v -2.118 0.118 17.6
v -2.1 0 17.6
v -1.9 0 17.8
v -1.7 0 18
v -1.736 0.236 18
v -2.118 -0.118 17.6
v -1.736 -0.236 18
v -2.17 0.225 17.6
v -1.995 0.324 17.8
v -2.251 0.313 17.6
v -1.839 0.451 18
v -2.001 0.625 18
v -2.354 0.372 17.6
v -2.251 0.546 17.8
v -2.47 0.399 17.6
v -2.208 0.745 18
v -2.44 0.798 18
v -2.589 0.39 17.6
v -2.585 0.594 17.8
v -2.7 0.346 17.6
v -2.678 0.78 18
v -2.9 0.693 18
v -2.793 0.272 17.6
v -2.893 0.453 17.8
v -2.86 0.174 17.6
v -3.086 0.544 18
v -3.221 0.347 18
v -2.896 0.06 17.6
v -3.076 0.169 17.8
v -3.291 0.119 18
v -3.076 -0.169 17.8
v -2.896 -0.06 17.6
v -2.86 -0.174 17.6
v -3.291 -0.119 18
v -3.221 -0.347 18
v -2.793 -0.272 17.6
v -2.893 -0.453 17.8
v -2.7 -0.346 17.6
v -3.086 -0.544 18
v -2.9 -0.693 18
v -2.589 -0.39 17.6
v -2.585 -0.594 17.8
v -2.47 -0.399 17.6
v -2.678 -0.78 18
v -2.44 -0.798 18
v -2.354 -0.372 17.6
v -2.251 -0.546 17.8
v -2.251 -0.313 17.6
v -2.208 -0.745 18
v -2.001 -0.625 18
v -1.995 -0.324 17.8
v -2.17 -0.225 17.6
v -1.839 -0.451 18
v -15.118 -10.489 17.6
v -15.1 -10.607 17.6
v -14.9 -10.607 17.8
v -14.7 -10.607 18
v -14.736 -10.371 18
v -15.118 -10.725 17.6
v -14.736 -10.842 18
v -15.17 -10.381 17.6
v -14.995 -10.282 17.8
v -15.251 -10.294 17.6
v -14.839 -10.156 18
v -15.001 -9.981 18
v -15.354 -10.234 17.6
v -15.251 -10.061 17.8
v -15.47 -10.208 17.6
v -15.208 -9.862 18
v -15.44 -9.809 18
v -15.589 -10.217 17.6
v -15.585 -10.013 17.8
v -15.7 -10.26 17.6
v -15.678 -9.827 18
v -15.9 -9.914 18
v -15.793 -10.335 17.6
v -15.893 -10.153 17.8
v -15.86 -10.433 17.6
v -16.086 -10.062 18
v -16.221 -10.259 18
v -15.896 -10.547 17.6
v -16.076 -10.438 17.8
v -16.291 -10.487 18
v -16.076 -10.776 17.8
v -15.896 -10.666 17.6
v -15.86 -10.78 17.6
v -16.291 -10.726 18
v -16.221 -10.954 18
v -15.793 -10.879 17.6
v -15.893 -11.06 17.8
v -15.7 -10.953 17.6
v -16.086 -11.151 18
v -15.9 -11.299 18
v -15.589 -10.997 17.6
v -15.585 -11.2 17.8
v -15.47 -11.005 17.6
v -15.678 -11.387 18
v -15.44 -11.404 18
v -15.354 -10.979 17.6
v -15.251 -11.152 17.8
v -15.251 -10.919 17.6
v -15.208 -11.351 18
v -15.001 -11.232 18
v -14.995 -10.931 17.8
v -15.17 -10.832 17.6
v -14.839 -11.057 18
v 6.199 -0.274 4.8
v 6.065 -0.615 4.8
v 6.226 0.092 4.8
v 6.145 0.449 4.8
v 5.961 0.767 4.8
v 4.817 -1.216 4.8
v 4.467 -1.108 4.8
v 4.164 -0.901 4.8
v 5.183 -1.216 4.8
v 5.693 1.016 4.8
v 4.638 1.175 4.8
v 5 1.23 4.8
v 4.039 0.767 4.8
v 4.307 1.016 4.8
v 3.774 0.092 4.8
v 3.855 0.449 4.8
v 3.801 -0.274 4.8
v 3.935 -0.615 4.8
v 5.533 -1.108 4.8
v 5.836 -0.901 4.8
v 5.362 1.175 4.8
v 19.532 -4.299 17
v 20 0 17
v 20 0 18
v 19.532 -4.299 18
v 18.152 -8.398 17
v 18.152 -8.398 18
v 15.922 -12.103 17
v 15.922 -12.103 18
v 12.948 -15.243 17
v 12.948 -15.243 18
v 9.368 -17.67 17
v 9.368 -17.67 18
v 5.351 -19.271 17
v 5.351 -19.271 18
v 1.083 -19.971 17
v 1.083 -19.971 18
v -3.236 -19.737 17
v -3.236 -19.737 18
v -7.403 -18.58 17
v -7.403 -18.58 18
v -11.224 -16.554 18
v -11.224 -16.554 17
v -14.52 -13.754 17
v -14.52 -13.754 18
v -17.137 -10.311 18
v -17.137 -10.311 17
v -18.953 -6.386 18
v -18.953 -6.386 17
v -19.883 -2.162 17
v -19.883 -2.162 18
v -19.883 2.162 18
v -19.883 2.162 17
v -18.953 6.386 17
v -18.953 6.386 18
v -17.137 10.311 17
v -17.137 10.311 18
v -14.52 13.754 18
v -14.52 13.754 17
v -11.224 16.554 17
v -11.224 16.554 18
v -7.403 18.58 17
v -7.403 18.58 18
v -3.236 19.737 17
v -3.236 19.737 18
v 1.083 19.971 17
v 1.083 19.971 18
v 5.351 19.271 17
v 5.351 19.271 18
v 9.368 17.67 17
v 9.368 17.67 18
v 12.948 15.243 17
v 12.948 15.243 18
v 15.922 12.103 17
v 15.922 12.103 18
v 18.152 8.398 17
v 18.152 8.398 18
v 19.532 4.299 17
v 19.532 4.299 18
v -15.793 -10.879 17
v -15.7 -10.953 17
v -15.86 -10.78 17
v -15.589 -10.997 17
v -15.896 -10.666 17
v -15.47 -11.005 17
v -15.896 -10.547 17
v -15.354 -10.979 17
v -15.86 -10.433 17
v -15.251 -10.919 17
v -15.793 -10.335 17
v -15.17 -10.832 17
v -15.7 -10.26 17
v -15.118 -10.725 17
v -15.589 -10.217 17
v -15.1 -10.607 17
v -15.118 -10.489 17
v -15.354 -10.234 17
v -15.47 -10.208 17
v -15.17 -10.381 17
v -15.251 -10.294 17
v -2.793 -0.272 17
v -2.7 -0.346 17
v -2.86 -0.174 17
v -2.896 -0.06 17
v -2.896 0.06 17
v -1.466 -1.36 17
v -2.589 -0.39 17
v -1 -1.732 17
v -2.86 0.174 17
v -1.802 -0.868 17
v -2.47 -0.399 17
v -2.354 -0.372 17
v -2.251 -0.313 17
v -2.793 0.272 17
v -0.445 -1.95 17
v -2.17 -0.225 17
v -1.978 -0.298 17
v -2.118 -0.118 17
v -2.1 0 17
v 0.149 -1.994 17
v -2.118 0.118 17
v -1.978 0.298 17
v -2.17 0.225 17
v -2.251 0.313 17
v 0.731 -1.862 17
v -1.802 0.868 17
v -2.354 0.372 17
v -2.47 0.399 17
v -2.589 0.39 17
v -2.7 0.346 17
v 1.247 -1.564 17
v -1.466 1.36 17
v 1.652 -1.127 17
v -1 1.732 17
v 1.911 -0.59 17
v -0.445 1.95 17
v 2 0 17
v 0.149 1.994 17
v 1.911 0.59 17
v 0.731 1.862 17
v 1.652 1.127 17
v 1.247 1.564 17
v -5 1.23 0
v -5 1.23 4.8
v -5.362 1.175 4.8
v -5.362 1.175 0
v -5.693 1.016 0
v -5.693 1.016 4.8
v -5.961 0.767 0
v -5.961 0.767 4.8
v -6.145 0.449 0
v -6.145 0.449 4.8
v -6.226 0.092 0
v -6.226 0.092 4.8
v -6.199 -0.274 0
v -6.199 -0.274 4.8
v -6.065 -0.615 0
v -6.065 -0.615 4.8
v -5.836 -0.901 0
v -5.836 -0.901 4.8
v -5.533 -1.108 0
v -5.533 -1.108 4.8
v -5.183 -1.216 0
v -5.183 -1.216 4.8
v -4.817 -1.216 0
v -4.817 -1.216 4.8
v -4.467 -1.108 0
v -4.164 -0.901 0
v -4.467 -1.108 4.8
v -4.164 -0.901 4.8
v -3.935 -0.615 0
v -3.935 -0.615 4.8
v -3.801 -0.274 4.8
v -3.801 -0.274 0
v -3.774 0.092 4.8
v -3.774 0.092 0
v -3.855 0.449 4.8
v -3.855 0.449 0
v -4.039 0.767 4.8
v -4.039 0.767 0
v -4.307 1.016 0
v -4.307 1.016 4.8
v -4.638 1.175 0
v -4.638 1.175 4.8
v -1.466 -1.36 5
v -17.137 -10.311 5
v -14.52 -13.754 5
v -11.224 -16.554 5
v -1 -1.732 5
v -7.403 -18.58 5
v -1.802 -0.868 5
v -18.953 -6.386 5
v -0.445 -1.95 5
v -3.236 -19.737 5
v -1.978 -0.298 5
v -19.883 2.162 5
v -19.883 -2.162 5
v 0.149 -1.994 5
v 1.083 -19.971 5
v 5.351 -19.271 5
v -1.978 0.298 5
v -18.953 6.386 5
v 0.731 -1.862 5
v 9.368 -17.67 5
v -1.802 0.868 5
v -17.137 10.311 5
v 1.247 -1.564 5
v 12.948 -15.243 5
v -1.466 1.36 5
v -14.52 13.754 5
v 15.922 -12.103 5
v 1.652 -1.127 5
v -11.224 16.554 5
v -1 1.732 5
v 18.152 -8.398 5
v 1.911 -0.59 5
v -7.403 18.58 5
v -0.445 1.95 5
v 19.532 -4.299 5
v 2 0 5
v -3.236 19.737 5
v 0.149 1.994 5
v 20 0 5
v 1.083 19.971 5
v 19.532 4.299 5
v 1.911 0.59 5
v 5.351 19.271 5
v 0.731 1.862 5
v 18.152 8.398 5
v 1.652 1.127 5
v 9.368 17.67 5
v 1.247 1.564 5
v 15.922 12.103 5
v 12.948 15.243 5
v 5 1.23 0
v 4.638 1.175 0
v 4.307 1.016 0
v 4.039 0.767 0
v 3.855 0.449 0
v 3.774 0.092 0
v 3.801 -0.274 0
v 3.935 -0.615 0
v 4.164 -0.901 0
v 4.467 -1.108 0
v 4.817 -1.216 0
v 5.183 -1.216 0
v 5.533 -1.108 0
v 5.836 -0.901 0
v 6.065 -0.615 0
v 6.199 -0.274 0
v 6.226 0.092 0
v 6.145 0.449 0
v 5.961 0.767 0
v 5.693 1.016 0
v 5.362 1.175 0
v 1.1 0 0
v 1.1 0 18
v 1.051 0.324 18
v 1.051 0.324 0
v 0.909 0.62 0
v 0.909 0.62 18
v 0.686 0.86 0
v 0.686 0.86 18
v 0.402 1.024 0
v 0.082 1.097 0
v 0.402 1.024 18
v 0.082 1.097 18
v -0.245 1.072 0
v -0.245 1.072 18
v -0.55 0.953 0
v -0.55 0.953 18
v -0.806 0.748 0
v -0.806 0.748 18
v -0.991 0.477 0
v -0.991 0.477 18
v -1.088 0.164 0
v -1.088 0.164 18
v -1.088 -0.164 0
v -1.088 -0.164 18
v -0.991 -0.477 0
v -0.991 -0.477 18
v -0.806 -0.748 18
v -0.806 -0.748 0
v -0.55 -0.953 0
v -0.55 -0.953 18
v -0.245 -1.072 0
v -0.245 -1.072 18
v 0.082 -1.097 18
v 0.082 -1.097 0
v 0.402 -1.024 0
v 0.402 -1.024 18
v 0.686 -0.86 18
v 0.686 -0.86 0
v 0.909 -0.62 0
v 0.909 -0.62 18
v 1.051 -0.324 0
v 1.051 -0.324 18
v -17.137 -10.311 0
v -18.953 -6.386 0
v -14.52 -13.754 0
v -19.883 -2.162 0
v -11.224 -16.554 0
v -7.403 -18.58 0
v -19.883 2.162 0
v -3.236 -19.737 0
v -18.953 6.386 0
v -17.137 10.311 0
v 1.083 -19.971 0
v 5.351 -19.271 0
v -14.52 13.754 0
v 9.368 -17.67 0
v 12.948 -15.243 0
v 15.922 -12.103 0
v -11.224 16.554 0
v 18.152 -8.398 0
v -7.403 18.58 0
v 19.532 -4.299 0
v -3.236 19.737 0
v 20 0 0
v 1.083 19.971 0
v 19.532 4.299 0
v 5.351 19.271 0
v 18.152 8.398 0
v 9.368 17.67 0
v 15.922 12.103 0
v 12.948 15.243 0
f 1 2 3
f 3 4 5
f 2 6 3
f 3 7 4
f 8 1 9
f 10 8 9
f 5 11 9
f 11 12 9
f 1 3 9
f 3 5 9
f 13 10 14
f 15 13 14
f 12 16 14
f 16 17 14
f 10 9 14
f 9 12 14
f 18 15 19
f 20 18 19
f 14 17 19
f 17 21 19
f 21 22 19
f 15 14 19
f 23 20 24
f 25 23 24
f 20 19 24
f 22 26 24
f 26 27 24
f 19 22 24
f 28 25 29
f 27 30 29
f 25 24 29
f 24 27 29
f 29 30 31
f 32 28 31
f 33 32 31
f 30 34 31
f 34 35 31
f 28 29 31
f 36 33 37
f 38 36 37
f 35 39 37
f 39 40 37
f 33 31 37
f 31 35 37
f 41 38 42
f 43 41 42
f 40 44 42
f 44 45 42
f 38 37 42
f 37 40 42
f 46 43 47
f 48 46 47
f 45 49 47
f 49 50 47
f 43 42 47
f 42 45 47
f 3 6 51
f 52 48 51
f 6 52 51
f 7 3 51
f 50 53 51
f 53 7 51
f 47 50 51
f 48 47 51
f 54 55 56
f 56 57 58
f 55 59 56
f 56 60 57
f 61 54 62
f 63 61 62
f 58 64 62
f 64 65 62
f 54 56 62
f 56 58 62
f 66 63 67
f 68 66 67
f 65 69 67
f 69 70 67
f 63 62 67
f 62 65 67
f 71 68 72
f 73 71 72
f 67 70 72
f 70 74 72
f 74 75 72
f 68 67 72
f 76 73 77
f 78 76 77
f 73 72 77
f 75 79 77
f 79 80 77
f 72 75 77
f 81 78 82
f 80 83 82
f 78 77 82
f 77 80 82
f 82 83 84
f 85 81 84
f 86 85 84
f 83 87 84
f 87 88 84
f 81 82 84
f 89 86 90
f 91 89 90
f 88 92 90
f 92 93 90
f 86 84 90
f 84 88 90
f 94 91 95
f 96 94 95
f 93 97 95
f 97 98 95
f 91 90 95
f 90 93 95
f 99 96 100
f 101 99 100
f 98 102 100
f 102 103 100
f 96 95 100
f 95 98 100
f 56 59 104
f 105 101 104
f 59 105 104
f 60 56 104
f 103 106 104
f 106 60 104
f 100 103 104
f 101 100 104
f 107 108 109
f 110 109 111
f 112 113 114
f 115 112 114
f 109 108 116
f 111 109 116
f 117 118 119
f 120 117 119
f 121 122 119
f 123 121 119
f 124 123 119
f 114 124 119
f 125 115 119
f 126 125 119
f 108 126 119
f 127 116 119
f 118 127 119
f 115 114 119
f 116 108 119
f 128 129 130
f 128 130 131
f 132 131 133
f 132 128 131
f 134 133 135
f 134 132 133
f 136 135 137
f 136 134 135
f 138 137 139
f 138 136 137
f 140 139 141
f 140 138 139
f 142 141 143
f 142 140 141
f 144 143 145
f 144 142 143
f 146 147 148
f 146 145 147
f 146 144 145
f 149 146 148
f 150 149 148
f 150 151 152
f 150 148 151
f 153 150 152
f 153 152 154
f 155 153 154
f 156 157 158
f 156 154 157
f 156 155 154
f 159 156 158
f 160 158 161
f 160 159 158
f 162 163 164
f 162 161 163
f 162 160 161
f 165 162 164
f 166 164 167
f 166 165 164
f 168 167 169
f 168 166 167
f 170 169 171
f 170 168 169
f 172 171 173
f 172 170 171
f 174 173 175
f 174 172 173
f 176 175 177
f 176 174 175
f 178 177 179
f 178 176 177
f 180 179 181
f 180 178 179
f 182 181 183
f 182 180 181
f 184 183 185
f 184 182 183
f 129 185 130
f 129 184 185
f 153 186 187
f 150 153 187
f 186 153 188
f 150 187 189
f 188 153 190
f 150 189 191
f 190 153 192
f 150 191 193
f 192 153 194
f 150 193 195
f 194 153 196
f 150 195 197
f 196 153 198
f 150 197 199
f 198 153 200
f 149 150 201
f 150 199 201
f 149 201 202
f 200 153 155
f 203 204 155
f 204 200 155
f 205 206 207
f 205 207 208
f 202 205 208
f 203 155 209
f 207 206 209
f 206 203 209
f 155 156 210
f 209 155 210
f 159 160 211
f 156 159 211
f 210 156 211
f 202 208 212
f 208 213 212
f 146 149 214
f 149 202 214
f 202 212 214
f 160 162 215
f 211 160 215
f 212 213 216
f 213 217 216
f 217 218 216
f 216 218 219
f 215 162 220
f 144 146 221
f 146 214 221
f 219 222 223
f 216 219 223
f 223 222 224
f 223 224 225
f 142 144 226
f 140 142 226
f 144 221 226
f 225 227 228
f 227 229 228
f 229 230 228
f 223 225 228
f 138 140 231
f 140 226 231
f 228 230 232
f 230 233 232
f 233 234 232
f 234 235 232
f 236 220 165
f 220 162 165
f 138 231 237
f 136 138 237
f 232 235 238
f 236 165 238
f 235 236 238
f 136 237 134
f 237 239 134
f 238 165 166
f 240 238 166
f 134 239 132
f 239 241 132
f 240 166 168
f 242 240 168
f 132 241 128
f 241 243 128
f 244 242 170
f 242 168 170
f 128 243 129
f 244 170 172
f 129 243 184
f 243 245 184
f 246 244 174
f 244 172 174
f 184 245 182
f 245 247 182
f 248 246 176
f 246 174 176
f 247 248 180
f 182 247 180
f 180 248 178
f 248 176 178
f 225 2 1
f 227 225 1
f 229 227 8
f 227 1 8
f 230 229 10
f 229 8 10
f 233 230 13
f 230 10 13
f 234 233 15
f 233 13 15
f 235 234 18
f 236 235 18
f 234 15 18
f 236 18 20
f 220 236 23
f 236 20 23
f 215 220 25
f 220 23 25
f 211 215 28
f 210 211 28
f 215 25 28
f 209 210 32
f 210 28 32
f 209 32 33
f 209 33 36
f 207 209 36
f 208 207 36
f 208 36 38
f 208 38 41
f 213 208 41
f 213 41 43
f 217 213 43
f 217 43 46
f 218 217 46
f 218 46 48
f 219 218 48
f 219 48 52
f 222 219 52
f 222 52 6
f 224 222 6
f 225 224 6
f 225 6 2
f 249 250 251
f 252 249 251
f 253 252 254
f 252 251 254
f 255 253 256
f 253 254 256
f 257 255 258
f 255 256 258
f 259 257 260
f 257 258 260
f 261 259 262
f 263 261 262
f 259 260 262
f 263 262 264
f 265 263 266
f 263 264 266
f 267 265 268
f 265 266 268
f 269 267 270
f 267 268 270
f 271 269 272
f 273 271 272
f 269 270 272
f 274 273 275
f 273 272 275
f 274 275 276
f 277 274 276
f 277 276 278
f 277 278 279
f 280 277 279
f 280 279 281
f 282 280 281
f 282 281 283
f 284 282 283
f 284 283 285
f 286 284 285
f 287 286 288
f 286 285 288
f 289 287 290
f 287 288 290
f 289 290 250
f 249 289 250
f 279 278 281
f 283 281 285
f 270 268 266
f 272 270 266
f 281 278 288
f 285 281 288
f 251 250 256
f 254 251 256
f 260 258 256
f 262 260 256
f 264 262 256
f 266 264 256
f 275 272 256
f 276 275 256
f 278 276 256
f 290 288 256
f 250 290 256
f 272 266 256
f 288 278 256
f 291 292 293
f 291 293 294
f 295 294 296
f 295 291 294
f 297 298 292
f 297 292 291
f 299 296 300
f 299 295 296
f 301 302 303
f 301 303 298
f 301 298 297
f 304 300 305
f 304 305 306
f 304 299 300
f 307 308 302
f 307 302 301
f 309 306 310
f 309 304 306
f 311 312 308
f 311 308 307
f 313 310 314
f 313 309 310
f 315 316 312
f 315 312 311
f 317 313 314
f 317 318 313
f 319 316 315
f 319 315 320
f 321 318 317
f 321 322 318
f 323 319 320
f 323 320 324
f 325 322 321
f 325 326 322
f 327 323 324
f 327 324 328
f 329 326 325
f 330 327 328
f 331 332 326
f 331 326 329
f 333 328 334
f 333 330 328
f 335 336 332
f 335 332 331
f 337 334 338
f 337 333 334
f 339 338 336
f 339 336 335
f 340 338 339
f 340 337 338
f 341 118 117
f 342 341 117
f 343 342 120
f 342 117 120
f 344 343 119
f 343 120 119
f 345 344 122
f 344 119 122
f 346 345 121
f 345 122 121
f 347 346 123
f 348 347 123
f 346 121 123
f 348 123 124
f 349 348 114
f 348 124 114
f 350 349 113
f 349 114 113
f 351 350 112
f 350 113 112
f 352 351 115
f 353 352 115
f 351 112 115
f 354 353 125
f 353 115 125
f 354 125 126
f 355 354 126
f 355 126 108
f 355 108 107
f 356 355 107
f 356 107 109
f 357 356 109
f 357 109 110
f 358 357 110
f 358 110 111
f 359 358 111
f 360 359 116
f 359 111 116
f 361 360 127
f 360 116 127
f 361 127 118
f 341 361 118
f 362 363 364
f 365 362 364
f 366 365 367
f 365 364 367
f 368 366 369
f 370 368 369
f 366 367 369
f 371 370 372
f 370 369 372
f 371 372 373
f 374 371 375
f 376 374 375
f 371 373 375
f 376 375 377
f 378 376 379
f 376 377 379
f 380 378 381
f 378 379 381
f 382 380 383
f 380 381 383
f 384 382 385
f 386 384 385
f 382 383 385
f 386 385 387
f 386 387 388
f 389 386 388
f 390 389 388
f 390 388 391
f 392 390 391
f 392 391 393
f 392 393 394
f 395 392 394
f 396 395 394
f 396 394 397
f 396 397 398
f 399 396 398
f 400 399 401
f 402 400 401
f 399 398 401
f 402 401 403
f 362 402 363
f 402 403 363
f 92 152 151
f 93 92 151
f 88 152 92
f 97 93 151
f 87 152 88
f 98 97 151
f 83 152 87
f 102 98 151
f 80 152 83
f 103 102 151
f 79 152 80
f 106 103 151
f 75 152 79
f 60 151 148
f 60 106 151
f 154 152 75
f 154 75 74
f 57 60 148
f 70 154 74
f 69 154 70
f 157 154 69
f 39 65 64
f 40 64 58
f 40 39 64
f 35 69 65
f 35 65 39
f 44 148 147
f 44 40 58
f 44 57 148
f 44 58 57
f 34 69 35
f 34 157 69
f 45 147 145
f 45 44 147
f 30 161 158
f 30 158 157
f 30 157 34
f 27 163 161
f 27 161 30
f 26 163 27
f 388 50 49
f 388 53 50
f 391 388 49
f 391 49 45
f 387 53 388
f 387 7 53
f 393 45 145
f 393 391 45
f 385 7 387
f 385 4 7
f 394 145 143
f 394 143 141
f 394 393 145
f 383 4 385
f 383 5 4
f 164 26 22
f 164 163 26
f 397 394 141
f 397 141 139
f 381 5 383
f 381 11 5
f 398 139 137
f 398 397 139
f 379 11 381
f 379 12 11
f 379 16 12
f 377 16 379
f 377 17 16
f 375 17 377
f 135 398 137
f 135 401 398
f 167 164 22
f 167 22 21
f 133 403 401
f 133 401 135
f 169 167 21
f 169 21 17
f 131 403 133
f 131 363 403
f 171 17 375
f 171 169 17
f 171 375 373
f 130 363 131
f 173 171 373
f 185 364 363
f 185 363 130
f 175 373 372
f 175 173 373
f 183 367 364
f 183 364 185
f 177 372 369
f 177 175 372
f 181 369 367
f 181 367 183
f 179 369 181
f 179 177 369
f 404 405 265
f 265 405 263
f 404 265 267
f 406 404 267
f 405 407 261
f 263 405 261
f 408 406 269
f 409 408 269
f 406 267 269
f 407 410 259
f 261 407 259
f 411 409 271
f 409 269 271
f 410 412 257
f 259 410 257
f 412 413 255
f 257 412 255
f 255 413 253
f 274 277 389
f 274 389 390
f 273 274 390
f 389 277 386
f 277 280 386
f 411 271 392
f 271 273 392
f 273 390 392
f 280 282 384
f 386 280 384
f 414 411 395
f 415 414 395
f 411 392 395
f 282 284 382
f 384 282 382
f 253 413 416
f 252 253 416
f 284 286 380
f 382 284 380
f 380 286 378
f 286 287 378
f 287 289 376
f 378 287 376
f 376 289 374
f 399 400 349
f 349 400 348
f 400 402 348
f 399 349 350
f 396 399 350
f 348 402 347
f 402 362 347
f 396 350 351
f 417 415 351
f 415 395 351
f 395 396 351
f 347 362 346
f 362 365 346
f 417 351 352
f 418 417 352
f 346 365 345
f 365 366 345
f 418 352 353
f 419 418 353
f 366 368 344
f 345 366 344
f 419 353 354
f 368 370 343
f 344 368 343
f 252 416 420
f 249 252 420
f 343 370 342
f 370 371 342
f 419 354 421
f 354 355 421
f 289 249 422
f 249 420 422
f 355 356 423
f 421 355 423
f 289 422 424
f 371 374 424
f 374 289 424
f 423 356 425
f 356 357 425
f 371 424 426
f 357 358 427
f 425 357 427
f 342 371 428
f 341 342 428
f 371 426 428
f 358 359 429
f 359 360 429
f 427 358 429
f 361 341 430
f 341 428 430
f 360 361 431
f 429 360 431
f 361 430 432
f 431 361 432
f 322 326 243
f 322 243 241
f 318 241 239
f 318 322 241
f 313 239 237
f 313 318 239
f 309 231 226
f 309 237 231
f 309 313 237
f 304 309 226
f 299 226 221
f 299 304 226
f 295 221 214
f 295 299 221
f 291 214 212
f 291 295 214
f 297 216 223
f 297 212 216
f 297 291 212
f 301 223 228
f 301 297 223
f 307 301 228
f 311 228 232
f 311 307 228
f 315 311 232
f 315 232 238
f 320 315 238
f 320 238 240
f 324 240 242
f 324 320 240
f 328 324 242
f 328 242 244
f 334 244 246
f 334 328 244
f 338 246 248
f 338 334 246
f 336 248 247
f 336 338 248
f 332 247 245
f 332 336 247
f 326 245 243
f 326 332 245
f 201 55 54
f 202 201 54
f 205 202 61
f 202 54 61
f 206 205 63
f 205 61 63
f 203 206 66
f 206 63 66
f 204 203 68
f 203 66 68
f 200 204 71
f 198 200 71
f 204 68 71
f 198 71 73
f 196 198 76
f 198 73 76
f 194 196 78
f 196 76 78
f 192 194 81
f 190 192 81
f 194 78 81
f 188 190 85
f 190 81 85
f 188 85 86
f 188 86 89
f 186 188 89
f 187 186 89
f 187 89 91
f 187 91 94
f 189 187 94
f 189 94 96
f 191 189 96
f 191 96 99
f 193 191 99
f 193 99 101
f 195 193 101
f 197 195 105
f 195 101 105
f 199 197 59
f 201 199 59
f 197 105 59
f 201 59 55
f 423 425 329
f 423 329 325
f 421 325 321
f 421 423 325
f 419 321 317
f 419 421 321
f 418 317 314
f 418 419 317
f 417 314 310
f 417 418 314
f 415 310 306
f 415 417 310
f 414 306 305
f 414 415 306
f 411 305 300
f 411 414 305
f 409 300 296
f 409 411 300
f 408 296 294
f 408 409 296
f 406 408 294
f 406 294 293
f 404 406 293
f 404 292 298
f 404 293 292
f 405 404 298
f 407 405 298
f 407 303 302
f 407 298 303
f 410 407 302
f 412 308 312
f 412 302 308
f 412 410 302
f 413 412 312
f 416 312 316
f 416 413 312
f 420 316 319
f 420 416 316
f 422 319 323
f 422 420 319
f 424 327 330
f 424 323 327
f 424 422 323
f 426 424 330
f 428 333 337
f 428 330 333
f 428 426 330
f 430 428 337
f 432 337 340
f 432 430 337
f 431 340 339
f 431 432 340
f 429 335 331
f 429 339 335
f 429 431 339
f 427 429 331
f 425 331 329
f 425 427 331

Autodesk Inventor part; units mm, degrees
ref_plane "YZ Plane" through (0, 0, 0) normal (1, 0, 0) x (0, 1, 0)
ref_plane "XZ Plane" through (0, 0, 0) normal (0, 1, 0) x (-1, 0, 0)
ref_plane "XY Plane" through (0, 0, 0) normal (0, 0, 1) x (1, 0, 0)
sketch "Sketch1" plane through (0, 0, 0) normal (0, 0, 1) x (1, 0, 0)
  circle A0 centre (0, 0) radius 20
  dimension "d0" = 40
extrude "Extrusion1" add sketch "Sketch1" along normal blind 5
sketch "Sketch2" plane through (0, 0, 5) normal (0, 0, 1) x (1, 0, 0)
  circle A0 centre (0, 0) radius 2
  dimension "d3" = 4
extrude "Extrusion2" add sketch "Sketch2" along normal blind 12
sketch "Sketch3" plane through (0, 0, 17) normal (0, 0, 1) x (1, 0, 0)
  circle A0 centre (0, 0) radius 20
  dimension "d6" = 40
extrude "Extrusion3" add sketch "Sketch3" along normal blind 1
sketch "Sketch4" plane through (0, 0, 18) normal (0, 0, 1) x (1, 0, 0)
  circle A0 centre (0, 0) radius 1.1
  dimension "d9" = 2.2
extrude "Extrusion4" cut sketch "Sketch4" against normal through all
sketch "Sketch6" plane through (0, 0, 18) normal (0, 0, 1) x (1, 0, 0)
  circle A0 centre (0, 0) radius 2 construction
  circle A1 centre (-15.5, -10.6066) radius 0.4
  circle A2 centre (-2.5, 0) radius 0.4
  circle A3 centre (0, 0) radius 20 projected
  dimension "d20" = 0.8
  dimension "d21" = 0.8
  dimension "d38" = 2.5
  dimension "d39" = 15.5
sketch "Sketch7" plane through (0, 0, 18) normal (0, 0, 1) x (1, 0, 0)
  point P0 (0, 0)
extrude "Extrusion5" cut sketch "Sketch6" against normal up to surface (1 mm away) contours A1 | A2
chamfer "Chamfer1" distance 0.4 angle 45 2 edges at (-2.9, 0, 18) (-15.9, -10.6066, 18)
sketch "Sketch11" plane through (0, 0, 0) normal (0, 0, -1) x (-1, 0, 0)
  circle A0 centre (0, 0) radius 20 projected
  point P0 (-5, 26.5)
  point P1 (-5, -26.5)
  dimension "d40" = 26.5
  dimension "d41" = 5
  dimension "d42" = 5
  dimension "d43" = 26.5
hole "Hole3" at (5, -26.5, 0) at (5, 26.5, 0) direction (0, 0, 1) diameter 1.567 end through all thread size "M2x0.4" class "6H" standard "ISO Metric profile"
sketch "Sketch12" plane through (0, 0, 0) normal (0, 0, -1) x (-1, 0, 0)
  point P0 (0, 0)
  point P1 (5, 0)
  point P2 (-5, 0)
  dimension "d55" = 5
  dimension "d56" = 5
hole "Hole4" at (-5, 0, 0) at (5, 0, 0) direction (0, 0, 1) diameter 2.459 depth 4.8 thread size "M3x0.5" class "6H" standard "ISO Metric profile"
loft "Loft1" [suppressed]
properties part number "Bobbin_z"
